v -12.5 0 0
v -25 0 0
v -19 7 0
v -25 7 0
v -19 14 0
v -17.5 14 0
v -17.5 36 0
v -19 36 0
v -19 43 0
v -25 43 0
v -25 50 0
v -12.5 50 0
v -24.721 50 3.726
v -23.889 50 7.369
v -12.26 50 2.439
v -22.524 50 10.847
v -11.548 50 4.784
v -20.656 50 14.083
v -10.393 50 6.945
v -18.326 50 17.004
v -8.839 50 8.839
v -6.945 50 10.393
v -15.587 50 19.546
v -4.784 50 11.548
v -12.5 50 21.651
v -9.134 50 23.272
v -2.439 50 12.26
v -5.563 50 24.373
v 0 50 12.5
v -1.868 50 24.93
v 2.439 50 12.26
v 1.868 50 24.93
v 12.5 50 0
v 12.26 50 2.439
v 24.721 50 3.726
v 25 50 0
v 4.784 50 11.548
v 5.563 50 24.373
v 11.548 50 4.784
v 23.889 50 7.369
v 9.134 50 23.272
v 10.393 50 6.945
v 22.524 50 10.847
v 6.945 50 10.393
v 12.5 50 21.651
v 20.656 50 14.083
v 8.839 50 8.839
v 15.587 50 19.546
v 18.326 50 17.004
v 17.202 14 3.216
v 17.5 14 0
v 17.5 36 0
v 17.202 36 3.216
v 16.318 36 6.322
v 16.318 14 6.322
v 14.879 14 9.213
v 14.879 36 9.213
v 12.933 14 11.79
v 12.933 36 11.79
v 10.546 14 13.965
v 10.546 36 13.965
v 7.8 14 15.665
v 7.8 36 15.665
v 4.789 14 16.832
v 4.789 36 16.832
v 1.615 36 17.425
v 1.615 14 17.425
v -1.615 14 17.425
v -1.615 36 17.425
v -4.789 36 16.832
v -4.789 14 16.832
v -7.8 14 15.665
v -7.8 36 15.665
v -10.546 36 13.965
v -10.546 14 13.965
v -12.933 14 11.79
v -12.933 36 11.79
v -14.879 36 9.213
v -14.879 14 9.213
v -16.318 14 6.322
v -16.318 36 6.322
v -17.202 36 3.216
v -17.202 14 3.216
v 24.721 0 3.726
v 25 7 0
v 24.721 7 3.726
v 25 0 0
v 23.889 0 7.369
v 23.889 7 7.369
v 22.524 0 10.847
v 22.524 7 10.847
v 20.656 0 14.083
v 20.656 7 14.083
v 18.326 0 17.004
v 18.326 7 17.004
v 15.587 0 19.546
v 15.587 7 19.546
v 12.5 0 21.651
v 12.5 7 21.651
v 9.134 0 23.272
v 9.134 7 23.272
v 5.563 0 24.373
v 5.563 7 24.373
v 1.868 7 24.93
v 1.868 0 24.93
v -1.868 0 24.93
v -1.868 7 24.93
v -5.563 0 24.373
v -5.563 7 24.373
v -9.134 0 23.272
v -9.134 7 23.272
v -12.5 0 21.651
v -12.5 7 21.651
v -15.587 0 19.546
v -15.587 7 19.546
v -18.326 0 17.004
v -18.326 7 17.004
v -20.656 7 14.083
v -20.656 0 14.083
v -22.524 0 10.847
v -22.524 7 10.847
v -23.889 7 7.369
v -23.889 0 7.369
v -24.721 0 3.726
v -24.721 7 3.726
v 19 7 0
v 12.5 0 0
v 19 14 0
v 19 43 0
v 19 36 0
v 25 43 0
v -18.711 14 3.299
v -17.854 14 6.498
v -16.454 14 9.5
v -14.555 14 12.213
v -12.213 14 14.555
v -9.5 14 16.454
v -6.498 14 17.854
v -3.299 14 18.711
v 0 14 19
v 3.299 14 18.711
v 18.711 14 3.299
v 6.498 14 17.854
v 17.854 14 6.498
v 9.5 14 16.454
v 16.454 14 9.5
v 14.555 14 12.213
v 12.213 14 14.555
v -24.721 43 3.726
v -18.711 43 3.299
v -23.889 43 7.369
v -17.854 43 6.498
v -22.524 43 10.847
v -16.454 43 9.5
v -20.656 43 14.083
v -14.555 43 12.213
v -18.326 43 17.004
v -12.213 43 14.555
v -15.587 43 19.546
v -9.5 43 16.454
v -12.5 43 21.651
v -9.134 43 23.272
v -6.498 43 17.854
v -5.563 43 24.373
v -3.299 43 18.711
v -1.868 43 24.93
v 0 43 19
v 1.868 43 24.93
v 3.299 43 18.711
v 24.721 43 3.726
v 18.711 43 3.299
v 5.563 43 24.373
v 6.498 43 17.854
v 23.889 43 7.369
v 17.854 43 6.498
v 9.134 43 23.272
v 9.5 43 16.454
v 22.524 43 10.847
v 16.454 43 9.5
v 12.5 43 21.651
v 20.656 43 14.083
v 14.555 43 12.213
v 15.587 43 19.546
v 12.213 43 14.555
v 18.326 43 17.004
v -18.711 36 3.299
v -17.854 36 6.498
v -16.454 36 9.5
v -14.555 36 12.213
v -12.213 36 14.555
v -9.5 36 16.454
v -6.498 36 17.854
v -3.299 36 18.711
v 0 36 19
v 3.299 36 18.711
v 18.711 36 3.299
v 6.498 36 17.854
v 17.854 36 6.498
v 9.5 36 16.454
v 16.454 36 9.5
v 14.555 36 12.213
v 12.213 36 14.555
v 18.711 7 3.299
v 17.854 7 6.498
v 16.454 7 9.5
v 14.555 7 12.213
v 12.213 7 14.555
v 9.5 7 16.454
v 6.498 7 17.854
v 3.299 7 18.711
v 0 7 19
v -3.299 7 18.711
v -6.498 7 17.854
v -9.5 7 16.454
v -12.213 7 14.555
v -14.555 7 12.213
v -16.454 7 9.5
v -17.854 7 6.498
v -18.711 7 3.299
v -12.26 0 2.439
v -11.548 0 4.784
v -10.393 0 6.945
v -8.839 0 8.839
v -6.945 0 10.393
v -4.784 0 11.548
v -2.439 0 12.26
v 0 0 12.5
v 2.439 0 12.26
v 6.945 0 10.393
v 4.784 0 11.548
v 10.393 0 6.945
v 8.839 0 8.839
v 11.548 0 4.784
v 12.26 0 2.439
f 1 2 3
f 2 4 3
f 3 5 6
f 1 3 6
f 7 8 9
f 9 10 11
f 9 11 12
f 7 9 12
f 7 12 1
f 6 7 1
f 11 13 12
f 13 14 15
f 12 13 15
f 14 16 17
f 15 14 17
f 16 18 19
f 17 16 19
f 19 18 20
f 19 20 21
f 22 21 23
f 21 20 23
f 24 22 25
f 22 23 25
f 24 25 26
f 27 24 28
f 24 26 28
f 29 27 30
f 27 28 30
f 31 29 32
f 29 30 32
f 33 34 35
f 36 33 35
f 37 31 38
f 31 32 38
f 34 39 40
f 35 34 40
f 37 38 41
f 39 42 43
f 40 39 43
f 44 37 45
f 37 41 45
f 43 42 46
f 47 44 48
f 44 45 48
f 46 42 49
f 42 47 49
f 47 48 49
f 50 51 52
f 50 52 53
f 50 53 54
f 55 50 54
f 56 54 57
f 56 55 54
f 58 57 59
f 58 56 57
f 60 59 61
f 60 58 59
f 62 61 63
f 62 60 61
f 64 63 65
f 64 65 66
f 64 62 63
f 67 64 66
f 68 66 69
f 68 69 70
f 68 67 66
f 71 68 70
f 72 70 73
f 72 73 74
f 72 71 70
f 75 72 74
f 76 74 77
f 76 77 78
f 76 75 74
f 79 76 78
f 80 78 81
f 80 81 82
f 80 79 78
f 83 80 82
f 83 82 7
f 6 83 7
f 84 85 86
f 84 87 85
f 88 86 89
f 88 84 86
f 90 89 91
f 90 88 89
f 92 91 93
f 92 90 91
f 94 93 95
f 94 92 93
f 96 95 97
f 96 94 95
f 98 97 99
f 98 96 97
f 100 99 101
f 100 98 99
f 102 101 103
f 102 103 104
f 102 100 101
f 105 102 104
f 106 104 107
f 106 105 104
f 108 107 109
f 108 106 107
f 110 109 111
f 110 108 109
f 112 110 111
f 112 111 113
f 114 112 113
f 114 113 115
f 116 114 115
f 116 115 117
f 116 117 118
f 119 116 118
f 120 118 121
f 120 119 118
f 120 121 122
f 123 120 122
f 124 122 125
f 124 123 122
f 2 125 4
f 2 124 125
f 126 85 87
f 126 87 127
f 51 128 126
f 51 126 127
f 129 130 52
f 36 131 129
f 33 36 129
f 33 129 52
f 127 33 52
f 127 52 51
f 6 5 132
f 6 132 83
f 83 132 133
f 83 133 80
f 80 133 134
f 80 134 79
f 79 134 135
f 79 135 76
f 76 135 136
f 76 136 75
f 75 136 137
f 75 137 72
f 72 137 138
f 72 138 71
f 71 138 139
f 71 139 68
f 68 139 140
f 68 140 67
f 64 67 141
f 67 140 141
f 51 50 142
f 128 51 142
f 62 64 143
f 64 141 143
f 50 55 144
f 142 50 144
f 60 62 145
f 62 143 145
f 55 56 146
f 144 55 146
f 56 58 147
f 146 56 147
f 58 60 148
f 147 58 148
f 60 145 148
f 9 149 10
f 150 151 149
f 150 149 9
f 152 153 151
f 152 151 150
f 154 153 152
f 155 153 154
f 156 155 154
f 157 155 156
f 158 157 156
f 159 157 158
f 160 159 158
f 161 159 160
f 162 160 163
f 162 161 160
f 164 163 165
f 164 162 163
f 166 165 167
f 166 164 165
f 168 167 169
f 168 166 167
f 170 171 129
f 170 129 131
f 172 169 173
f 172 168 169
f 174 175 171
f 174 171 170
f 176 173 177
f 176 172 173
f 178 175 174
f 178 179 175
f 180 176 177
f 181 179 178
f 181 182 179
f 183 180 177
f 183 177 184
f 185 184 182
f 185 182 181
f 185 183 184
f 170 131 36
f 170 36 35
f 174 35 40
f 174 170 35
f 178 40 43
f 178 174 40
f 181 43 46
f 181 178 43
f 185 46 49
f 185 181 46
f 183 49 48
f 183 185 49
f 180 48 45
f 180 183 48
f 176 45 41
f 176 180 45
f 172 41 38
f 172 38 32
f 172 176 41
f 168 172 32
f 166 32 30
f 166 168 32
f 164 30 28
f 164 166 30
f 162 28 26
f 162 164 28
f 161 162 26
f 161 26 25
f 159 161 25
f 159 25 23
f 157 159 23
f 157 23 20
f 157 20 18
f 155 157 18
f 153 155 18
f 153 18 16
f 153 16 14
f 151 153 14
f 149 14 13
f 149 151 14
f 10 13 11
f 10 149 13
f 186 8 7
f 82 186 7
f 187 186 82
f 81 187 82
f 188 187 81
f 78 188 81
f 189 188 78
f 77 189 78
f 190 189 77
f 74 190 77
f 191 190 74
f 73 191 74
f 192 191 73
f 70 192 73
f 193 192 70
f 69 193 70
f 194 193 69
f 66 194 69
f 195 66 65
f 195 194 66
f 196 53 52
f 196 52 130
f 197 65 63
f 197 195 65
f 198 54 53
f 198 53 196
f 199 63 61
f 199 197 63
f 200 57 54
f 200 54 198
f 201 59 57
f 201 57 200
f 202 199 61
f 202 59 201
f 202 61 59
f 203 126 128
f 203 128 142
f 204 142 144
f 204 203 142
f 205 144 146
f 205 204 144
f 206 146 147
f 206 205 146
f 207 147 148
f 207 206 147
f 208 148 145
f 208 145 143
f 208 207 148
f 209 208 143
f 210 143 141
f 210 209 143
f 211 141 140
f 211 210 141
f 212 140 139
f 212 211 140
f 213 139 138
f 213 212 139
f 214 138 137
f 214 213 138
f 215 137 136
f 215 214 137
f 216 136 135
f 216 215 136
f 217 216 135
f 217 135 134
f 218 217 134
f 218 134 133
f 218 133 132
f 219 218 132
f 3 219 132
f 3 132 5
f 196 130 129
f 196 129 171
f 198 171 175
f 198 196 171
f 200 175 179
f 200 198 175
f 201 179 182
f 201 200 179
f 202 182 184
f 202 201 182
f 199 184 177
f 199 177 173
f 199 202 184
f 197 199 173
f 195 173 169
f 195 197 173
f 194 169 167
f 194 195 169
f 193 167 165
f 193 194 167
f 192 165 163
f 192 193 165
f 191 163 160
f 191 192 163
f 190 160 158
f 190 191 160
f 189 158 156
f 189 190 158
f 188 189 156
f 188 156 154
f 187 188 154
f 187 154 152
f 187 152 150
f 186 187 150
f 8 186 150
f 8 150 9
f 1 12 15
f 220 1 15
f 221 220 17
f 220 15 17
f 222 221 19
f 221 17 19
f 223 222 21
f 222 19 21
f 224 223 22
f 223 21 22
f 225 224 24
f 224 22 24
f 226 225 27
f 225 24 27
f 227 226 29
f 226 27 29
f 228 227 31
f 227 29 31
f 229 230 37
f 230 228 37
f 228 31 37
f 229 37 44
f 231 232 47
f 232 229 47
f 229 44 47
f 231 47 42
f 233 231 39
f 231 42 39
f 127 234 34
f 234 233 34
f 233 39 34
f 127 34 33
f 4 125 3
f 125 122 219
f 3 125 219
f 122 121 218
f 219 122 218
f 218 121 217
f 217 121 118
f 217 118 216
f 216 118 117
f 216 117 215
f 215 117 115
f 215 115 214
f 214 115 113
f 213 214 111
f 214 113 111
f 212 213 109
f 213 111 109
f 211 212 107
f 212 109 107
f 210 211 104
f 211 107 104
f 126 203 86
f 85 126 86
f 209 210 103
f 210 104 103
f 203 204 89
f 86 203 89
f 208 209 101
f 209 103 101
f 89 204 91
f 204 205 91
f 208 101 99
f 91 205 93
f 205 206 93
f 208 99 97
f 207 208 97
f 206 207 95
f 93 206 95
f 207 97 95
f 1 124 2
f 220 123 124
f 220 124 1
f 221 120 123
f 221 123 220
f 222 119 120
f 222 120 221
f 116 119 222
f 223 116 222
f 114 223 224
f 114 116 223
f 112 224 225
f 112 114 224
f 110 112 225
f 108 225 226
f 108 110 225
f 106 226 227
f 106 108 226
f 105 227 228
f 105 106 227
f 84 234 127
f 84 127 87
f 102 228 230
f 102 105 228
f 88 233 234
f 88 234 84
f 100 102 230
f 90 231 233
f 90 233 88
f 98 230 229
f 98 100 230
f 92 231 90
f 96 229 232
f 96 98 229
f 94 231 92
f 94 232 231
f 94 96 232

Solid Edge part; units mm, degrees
sketch "Sketch1" plane through (0, 0, 0) normal (0, 0, 1) x (1, 0, 0)
  line L0 (12.5, 0) -> (12.5, 50)
  line L1 (12.5, 50) -> (25, 50)
  line L2 (25, 50) -> (25, 43)
  line L3 (25, 43) -> (19, 43)
  line L4 (19, 43) -> (19, 36)
  line L5 (19, 36) -> (17.5, 36)
  line L6 (17.5, 36) -> (17.5, 14)
  line L7 (17.5, 14) -> (19, 14)
  line L8 (19, 14) -> (19, 7)
  line L9 (19, 7) -> (25, 7)
  line L10 (25, 7) -> (25, 0)
  line L11 (25, 0) -> (12.5, 0)
  dimension "D1" = 50
  dimension "D2" = 25
  dimension "D3" = 19
  dimension "D4" = 17.5
  dimension "D5" = 12.5
  dimension "D6" = 19
  dimension "D7" = 25
  dimension "D8" = 7
  dimension "D9" = 7
  dimension "D10" = 7
  dimension "D11" = 7
  dimension "D12" = 22
revolve "RevolvedProtrusion1" add sketch "Sketch1" angle 180 about axis through (0, 54, 0) along (0, -1, 0)
